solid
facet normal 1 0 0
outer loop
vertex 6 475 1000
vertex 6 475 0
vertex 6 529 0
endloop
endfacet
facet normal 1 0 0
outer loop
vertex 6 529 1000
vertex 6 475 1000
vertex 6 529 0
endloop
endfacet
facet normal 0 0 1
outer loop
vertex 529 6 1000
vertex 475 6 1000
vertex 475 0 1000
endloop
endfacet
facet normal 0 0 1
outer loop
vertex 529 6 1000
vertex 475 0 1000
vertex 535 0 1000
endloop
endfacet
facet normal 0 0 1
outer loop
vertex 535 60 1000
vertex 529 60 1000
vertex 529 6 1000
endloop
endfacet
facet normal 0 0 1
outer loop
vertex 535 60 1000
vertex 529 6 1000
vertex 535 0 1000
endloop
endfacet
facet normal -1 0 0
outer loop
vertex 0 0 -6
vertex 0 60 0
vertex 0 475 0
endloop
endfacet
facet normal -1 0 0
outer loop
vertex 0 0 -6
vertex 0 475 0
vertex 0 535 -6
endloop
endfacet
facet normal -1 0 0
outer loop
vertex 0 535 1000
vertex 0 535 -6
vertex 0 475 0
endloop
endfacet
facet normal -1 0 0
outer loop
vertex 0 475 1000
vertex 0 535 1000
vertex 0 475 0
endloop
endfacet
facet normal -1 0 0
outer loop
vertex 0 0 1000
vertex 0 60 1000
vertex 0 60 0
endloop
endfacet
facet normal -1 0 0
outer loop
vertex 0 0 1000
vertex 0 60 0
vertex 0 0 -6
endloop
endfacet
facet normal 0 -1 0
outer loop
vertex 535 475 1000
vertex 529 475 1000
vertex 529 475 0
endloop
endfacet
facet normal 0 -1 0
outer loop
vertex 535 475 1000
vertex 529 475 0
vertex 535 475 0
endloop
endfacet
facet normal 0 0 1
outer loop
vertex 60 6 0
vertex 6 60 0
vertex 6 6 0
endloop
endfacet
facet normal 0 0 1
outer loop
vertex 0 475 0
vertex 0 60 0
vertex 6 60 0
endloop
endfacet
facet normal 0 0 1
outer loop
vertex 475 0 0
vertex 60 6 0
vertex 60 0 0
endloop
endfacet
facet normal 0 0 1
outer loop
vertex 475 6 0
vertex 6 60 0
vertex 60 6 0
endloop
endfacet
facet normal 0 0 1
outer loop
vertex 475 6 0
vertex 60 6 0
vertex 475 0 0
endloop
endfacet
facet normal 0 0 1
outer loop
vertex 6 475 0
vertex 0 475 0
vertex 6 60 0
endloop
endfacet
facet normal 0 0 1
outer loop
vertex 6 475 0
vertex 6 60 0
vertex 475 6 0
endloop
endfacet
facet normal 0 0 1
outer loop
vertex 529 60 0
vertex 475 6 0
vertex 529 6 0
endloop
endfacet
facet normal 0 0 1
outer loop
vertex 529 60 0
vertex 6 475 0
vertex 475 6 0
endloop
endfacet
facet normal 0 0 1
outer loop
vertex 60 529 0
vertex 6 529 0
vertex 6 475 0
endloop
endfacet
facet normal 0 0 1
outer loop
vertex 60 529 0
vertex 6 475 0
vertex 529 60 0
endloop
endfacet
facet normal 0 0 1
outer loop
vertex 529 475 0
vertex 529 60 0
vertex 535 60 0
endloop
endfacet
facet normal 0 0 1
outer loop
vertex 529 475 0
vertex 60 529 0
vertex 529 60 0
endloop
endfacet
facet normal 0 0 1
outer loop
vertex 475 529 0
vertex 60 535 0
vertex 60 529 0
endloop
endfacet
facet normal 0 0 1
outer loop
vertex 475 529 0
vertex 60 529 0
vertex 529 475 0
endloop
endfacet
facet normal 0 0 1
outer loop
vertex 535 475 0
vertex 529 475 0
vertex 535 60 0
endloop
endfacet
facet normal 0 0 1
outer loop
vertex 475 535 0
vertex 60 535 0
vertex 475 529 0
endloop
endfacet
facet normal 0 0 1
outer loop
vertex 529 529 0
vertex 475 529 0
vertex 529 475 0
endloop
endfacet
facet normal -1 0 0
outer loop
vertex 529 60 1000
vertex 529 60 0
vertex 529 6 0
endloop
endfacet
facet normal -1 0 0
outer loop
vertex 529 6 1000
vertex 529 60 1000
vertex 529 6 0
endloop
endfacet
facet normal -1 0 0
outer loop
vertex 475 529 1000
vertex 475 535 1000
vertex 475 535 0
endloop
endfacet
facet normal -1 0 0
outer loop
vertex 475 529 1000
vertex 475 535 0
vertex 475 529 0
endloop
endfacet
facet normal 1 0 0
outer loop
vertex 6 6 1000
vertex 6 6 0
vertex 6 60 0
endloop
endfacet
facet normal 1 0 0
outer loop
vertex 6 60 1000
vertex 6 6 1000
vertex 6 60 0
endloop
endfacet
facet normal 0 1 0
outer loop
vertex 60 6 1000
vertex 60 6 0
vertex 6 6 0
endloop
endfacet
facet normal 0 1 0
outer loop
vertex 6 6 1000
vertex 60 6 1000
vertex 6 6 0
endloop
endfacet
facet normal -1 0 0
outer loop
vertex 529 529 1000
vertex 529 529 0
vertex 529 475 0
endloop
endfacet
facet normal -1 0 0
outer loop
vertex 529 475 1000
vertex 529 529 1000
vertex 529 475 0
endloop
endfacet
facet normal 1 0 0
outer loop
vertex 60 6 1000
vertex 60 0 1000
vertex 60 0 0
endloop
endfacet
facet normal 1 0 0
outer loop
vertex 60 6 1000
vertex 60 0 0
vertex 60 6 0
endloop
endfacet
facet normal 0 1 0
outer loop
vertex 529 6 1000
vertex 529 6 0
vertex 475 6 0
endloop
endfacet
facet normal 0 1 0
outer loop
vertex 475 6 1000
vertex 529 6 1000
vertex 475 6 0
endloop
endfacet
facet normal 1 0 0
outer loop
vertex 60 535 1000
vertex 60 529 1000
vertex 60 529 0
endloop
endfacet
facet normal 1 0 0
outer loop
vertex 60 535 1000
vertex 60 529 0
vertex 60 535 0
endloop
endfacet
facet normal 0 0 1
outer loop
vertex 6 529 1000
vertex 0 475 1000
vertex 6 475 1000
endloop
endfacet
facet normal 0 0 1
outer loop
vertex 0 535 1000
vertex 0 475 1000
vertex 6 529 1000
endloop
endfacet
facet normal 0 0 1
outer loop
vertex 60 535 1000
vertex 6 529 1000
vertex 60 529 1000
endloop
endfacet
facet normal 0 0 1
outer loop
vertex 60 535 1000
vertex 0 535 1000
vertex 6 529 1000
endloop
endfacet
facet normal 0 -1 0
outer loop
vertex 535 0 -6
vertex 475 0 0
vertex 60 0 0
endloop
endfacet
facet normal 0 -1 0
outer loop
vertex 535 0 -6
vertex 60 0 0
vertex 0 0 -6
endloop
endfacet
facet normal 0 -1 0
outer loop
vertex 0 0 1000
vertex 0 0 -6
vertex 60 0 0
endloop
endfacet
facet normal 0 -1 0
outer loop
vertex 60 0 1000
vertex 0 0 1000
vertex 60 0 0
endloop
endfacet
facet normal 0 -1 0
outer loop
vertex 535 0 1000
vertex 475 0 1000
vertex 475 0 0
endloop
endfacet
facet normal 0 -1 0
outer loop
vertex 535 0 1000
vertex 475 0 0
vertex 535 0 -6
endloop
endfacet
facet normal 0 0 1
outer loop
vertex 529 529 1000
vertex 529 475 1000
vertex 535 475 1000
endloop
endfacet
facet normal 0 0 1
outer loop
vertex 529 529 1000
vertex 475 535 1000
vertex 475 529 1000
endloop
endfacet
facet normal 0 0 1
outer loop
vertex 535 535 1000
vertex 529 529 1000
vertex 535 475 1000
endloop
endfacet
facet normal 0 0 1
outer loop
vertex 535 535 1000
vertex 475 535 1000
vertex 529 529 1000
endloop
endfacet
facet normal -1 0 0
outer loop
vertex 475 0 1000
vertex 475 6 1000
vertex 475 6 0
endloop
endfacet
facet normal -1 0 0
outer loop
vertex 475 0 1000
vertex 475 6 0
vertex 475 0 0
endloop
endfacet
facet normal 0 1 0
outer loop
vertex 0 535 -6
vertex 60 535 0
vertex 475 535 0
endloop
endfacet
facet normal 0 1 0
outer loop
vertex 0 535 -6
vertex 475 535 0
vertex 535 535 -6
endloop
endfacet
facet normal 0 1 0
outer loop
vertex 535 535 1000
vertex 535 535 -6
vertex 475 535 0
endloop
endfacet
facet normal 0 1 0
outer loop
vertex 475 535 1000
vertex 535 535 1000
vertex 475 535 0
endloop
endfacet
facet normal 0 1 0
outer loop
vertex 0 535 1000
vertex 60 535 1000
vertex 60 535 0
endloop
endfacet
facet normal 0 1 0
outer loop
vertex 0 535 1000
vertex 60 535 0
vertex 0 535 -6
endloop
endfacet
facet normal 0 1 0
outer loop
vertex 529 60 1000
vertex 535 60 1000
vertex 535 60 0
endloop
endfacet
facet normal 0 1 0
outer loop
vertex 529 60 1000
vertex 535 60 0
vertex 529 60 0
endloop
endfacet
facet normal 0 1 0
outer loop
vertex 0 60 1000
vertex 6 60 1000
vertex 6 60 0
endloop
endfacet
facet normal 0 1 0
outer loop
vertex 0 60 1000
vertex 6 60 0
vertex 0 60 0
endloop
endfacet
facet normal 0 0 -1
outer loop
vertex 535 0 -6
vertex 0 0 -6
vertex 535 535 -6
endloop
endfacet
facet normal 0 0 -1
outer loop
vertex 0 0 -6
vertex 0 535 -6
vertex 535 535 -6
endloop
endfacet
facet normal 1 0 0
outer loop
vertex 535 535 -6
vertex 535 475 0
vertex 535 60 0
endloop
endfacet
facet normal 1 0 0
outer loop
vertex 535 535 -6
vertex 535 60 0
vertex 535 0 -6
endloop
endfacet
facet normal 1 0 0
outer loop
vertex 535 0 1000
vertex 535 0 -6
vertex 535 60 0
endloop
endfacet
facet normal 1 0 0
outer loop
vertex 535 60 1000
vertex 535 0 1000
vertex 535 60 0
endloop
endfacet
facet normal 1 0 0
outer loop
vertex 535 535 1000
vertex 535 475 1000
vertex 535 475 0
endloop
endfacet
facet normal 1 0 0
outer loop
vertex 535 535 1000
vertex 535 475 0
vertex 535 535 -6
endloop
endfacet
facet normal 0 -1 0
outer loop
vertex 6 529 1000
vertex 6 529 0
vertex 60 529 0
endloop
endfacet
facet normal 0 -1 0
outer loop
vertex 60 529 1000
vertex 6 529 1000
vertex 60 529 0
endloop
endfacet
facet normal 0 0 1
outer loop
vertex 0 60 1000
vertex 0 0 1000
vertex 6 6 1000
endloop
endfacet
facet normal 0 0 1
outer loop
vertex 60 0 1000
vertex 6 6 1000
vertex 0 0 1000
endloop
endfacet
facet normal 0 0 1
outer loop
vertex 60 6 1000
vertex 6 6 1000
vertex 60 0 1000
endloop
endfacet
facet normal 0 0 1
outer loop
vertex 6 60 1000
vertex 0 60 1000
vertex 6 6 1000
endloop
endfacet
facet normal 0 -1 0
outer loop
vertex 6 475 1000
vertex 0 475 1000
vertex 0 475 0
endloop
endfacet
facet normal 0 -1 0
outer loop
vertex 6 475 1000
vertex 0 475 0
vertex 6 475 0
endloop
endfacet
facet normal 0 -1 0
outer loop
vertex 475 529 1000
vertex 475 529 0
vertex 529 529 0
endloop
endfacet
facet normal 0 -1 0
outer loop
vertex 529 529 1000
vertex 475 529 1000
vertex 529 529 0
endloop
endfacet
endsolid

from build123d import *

# Parameters (mm, degrees)
F1_DEPTH = 1000
F2_DEPTH = 6


with BuildPart() as f1:
    # F0 (on Top) → F1 (new body)
    with BuildSketch(Plane.XY):
        Polygon((0, 535), (0, 475), (6, 475), (6, 529), (60, 529), (60, 535), align=None)
    extrude(amount=F1_DEPTH)



with BuildPart() as f1b:
    # F0 (on Top) → F1, piece 2 (new body)
    with BuildSketch(Plane.XY):
        Polygon((529, 475), (535, 475), (535, 535), (475, 535), (475, 529), (529, 529), align=None)
    extrude(amount=F1_DEPTH)


with BuildPart() as f1c:
    # F0 (on Top) → F1, piece 3 (new body)
    with BuildSketch(Plane.XY):
        Polygon((475, 6), (475, 0), (535, 0), (535, 60), (529, 60), (529, 6), align=None)
    extrude(amount=F1_DEPTH)


with BuildPart() as f1d:
    # F0 (on Top) → F1, piece 4 (new body)
    with BuildSketch(Plane.XY):
        Polygon((0, 60), (0, 0), (60, 0), (60, 6), (6, 6), (6, 60), align=None)
    extrude(amount=F1_DEPTH)


with BuildPart() as f1_1:
    add(f1.part)

    add(f1b.part)  # F2 merges F1b

    add(f1c.part)  # F2 merges F1c

    add(f1d.part)  # F2 merges F1d
    # F0 (on Top) → F2 (join)
    with BuildSketch(Plane.XY):
        Polygon((0, 60), (0, 0), (60, 0), (60, 6), (6, 6), (6, 60), align=None)
        Polygon((60, 6), (60, 0), (475, 0), (475, 6), (529, 6), (529, 60), (535, 60), (535, 475), (529, 475), (529, 529), (475, 529), (475, 535), (60, 535), (60, 529), (6, 529), (6, 475), (0, 475), (0, 60), (6, 60), (6, 6), align=None)
        Polygon((475, 6), (475, 0), (535, 0), (535, 60), (529, 60), (529, 6), align=None)
        Polygon((0, 535), (0, 475), (6, 475), (6, 529), (60, 529), (60, 535), align=None)
        Polygon((529, 475), (535, 475), (535, 535), (475, 535), (475, 529), (529, 529), align=None)
    extrude(amount=-F2_DEPTH)


solid = f1_1.part
